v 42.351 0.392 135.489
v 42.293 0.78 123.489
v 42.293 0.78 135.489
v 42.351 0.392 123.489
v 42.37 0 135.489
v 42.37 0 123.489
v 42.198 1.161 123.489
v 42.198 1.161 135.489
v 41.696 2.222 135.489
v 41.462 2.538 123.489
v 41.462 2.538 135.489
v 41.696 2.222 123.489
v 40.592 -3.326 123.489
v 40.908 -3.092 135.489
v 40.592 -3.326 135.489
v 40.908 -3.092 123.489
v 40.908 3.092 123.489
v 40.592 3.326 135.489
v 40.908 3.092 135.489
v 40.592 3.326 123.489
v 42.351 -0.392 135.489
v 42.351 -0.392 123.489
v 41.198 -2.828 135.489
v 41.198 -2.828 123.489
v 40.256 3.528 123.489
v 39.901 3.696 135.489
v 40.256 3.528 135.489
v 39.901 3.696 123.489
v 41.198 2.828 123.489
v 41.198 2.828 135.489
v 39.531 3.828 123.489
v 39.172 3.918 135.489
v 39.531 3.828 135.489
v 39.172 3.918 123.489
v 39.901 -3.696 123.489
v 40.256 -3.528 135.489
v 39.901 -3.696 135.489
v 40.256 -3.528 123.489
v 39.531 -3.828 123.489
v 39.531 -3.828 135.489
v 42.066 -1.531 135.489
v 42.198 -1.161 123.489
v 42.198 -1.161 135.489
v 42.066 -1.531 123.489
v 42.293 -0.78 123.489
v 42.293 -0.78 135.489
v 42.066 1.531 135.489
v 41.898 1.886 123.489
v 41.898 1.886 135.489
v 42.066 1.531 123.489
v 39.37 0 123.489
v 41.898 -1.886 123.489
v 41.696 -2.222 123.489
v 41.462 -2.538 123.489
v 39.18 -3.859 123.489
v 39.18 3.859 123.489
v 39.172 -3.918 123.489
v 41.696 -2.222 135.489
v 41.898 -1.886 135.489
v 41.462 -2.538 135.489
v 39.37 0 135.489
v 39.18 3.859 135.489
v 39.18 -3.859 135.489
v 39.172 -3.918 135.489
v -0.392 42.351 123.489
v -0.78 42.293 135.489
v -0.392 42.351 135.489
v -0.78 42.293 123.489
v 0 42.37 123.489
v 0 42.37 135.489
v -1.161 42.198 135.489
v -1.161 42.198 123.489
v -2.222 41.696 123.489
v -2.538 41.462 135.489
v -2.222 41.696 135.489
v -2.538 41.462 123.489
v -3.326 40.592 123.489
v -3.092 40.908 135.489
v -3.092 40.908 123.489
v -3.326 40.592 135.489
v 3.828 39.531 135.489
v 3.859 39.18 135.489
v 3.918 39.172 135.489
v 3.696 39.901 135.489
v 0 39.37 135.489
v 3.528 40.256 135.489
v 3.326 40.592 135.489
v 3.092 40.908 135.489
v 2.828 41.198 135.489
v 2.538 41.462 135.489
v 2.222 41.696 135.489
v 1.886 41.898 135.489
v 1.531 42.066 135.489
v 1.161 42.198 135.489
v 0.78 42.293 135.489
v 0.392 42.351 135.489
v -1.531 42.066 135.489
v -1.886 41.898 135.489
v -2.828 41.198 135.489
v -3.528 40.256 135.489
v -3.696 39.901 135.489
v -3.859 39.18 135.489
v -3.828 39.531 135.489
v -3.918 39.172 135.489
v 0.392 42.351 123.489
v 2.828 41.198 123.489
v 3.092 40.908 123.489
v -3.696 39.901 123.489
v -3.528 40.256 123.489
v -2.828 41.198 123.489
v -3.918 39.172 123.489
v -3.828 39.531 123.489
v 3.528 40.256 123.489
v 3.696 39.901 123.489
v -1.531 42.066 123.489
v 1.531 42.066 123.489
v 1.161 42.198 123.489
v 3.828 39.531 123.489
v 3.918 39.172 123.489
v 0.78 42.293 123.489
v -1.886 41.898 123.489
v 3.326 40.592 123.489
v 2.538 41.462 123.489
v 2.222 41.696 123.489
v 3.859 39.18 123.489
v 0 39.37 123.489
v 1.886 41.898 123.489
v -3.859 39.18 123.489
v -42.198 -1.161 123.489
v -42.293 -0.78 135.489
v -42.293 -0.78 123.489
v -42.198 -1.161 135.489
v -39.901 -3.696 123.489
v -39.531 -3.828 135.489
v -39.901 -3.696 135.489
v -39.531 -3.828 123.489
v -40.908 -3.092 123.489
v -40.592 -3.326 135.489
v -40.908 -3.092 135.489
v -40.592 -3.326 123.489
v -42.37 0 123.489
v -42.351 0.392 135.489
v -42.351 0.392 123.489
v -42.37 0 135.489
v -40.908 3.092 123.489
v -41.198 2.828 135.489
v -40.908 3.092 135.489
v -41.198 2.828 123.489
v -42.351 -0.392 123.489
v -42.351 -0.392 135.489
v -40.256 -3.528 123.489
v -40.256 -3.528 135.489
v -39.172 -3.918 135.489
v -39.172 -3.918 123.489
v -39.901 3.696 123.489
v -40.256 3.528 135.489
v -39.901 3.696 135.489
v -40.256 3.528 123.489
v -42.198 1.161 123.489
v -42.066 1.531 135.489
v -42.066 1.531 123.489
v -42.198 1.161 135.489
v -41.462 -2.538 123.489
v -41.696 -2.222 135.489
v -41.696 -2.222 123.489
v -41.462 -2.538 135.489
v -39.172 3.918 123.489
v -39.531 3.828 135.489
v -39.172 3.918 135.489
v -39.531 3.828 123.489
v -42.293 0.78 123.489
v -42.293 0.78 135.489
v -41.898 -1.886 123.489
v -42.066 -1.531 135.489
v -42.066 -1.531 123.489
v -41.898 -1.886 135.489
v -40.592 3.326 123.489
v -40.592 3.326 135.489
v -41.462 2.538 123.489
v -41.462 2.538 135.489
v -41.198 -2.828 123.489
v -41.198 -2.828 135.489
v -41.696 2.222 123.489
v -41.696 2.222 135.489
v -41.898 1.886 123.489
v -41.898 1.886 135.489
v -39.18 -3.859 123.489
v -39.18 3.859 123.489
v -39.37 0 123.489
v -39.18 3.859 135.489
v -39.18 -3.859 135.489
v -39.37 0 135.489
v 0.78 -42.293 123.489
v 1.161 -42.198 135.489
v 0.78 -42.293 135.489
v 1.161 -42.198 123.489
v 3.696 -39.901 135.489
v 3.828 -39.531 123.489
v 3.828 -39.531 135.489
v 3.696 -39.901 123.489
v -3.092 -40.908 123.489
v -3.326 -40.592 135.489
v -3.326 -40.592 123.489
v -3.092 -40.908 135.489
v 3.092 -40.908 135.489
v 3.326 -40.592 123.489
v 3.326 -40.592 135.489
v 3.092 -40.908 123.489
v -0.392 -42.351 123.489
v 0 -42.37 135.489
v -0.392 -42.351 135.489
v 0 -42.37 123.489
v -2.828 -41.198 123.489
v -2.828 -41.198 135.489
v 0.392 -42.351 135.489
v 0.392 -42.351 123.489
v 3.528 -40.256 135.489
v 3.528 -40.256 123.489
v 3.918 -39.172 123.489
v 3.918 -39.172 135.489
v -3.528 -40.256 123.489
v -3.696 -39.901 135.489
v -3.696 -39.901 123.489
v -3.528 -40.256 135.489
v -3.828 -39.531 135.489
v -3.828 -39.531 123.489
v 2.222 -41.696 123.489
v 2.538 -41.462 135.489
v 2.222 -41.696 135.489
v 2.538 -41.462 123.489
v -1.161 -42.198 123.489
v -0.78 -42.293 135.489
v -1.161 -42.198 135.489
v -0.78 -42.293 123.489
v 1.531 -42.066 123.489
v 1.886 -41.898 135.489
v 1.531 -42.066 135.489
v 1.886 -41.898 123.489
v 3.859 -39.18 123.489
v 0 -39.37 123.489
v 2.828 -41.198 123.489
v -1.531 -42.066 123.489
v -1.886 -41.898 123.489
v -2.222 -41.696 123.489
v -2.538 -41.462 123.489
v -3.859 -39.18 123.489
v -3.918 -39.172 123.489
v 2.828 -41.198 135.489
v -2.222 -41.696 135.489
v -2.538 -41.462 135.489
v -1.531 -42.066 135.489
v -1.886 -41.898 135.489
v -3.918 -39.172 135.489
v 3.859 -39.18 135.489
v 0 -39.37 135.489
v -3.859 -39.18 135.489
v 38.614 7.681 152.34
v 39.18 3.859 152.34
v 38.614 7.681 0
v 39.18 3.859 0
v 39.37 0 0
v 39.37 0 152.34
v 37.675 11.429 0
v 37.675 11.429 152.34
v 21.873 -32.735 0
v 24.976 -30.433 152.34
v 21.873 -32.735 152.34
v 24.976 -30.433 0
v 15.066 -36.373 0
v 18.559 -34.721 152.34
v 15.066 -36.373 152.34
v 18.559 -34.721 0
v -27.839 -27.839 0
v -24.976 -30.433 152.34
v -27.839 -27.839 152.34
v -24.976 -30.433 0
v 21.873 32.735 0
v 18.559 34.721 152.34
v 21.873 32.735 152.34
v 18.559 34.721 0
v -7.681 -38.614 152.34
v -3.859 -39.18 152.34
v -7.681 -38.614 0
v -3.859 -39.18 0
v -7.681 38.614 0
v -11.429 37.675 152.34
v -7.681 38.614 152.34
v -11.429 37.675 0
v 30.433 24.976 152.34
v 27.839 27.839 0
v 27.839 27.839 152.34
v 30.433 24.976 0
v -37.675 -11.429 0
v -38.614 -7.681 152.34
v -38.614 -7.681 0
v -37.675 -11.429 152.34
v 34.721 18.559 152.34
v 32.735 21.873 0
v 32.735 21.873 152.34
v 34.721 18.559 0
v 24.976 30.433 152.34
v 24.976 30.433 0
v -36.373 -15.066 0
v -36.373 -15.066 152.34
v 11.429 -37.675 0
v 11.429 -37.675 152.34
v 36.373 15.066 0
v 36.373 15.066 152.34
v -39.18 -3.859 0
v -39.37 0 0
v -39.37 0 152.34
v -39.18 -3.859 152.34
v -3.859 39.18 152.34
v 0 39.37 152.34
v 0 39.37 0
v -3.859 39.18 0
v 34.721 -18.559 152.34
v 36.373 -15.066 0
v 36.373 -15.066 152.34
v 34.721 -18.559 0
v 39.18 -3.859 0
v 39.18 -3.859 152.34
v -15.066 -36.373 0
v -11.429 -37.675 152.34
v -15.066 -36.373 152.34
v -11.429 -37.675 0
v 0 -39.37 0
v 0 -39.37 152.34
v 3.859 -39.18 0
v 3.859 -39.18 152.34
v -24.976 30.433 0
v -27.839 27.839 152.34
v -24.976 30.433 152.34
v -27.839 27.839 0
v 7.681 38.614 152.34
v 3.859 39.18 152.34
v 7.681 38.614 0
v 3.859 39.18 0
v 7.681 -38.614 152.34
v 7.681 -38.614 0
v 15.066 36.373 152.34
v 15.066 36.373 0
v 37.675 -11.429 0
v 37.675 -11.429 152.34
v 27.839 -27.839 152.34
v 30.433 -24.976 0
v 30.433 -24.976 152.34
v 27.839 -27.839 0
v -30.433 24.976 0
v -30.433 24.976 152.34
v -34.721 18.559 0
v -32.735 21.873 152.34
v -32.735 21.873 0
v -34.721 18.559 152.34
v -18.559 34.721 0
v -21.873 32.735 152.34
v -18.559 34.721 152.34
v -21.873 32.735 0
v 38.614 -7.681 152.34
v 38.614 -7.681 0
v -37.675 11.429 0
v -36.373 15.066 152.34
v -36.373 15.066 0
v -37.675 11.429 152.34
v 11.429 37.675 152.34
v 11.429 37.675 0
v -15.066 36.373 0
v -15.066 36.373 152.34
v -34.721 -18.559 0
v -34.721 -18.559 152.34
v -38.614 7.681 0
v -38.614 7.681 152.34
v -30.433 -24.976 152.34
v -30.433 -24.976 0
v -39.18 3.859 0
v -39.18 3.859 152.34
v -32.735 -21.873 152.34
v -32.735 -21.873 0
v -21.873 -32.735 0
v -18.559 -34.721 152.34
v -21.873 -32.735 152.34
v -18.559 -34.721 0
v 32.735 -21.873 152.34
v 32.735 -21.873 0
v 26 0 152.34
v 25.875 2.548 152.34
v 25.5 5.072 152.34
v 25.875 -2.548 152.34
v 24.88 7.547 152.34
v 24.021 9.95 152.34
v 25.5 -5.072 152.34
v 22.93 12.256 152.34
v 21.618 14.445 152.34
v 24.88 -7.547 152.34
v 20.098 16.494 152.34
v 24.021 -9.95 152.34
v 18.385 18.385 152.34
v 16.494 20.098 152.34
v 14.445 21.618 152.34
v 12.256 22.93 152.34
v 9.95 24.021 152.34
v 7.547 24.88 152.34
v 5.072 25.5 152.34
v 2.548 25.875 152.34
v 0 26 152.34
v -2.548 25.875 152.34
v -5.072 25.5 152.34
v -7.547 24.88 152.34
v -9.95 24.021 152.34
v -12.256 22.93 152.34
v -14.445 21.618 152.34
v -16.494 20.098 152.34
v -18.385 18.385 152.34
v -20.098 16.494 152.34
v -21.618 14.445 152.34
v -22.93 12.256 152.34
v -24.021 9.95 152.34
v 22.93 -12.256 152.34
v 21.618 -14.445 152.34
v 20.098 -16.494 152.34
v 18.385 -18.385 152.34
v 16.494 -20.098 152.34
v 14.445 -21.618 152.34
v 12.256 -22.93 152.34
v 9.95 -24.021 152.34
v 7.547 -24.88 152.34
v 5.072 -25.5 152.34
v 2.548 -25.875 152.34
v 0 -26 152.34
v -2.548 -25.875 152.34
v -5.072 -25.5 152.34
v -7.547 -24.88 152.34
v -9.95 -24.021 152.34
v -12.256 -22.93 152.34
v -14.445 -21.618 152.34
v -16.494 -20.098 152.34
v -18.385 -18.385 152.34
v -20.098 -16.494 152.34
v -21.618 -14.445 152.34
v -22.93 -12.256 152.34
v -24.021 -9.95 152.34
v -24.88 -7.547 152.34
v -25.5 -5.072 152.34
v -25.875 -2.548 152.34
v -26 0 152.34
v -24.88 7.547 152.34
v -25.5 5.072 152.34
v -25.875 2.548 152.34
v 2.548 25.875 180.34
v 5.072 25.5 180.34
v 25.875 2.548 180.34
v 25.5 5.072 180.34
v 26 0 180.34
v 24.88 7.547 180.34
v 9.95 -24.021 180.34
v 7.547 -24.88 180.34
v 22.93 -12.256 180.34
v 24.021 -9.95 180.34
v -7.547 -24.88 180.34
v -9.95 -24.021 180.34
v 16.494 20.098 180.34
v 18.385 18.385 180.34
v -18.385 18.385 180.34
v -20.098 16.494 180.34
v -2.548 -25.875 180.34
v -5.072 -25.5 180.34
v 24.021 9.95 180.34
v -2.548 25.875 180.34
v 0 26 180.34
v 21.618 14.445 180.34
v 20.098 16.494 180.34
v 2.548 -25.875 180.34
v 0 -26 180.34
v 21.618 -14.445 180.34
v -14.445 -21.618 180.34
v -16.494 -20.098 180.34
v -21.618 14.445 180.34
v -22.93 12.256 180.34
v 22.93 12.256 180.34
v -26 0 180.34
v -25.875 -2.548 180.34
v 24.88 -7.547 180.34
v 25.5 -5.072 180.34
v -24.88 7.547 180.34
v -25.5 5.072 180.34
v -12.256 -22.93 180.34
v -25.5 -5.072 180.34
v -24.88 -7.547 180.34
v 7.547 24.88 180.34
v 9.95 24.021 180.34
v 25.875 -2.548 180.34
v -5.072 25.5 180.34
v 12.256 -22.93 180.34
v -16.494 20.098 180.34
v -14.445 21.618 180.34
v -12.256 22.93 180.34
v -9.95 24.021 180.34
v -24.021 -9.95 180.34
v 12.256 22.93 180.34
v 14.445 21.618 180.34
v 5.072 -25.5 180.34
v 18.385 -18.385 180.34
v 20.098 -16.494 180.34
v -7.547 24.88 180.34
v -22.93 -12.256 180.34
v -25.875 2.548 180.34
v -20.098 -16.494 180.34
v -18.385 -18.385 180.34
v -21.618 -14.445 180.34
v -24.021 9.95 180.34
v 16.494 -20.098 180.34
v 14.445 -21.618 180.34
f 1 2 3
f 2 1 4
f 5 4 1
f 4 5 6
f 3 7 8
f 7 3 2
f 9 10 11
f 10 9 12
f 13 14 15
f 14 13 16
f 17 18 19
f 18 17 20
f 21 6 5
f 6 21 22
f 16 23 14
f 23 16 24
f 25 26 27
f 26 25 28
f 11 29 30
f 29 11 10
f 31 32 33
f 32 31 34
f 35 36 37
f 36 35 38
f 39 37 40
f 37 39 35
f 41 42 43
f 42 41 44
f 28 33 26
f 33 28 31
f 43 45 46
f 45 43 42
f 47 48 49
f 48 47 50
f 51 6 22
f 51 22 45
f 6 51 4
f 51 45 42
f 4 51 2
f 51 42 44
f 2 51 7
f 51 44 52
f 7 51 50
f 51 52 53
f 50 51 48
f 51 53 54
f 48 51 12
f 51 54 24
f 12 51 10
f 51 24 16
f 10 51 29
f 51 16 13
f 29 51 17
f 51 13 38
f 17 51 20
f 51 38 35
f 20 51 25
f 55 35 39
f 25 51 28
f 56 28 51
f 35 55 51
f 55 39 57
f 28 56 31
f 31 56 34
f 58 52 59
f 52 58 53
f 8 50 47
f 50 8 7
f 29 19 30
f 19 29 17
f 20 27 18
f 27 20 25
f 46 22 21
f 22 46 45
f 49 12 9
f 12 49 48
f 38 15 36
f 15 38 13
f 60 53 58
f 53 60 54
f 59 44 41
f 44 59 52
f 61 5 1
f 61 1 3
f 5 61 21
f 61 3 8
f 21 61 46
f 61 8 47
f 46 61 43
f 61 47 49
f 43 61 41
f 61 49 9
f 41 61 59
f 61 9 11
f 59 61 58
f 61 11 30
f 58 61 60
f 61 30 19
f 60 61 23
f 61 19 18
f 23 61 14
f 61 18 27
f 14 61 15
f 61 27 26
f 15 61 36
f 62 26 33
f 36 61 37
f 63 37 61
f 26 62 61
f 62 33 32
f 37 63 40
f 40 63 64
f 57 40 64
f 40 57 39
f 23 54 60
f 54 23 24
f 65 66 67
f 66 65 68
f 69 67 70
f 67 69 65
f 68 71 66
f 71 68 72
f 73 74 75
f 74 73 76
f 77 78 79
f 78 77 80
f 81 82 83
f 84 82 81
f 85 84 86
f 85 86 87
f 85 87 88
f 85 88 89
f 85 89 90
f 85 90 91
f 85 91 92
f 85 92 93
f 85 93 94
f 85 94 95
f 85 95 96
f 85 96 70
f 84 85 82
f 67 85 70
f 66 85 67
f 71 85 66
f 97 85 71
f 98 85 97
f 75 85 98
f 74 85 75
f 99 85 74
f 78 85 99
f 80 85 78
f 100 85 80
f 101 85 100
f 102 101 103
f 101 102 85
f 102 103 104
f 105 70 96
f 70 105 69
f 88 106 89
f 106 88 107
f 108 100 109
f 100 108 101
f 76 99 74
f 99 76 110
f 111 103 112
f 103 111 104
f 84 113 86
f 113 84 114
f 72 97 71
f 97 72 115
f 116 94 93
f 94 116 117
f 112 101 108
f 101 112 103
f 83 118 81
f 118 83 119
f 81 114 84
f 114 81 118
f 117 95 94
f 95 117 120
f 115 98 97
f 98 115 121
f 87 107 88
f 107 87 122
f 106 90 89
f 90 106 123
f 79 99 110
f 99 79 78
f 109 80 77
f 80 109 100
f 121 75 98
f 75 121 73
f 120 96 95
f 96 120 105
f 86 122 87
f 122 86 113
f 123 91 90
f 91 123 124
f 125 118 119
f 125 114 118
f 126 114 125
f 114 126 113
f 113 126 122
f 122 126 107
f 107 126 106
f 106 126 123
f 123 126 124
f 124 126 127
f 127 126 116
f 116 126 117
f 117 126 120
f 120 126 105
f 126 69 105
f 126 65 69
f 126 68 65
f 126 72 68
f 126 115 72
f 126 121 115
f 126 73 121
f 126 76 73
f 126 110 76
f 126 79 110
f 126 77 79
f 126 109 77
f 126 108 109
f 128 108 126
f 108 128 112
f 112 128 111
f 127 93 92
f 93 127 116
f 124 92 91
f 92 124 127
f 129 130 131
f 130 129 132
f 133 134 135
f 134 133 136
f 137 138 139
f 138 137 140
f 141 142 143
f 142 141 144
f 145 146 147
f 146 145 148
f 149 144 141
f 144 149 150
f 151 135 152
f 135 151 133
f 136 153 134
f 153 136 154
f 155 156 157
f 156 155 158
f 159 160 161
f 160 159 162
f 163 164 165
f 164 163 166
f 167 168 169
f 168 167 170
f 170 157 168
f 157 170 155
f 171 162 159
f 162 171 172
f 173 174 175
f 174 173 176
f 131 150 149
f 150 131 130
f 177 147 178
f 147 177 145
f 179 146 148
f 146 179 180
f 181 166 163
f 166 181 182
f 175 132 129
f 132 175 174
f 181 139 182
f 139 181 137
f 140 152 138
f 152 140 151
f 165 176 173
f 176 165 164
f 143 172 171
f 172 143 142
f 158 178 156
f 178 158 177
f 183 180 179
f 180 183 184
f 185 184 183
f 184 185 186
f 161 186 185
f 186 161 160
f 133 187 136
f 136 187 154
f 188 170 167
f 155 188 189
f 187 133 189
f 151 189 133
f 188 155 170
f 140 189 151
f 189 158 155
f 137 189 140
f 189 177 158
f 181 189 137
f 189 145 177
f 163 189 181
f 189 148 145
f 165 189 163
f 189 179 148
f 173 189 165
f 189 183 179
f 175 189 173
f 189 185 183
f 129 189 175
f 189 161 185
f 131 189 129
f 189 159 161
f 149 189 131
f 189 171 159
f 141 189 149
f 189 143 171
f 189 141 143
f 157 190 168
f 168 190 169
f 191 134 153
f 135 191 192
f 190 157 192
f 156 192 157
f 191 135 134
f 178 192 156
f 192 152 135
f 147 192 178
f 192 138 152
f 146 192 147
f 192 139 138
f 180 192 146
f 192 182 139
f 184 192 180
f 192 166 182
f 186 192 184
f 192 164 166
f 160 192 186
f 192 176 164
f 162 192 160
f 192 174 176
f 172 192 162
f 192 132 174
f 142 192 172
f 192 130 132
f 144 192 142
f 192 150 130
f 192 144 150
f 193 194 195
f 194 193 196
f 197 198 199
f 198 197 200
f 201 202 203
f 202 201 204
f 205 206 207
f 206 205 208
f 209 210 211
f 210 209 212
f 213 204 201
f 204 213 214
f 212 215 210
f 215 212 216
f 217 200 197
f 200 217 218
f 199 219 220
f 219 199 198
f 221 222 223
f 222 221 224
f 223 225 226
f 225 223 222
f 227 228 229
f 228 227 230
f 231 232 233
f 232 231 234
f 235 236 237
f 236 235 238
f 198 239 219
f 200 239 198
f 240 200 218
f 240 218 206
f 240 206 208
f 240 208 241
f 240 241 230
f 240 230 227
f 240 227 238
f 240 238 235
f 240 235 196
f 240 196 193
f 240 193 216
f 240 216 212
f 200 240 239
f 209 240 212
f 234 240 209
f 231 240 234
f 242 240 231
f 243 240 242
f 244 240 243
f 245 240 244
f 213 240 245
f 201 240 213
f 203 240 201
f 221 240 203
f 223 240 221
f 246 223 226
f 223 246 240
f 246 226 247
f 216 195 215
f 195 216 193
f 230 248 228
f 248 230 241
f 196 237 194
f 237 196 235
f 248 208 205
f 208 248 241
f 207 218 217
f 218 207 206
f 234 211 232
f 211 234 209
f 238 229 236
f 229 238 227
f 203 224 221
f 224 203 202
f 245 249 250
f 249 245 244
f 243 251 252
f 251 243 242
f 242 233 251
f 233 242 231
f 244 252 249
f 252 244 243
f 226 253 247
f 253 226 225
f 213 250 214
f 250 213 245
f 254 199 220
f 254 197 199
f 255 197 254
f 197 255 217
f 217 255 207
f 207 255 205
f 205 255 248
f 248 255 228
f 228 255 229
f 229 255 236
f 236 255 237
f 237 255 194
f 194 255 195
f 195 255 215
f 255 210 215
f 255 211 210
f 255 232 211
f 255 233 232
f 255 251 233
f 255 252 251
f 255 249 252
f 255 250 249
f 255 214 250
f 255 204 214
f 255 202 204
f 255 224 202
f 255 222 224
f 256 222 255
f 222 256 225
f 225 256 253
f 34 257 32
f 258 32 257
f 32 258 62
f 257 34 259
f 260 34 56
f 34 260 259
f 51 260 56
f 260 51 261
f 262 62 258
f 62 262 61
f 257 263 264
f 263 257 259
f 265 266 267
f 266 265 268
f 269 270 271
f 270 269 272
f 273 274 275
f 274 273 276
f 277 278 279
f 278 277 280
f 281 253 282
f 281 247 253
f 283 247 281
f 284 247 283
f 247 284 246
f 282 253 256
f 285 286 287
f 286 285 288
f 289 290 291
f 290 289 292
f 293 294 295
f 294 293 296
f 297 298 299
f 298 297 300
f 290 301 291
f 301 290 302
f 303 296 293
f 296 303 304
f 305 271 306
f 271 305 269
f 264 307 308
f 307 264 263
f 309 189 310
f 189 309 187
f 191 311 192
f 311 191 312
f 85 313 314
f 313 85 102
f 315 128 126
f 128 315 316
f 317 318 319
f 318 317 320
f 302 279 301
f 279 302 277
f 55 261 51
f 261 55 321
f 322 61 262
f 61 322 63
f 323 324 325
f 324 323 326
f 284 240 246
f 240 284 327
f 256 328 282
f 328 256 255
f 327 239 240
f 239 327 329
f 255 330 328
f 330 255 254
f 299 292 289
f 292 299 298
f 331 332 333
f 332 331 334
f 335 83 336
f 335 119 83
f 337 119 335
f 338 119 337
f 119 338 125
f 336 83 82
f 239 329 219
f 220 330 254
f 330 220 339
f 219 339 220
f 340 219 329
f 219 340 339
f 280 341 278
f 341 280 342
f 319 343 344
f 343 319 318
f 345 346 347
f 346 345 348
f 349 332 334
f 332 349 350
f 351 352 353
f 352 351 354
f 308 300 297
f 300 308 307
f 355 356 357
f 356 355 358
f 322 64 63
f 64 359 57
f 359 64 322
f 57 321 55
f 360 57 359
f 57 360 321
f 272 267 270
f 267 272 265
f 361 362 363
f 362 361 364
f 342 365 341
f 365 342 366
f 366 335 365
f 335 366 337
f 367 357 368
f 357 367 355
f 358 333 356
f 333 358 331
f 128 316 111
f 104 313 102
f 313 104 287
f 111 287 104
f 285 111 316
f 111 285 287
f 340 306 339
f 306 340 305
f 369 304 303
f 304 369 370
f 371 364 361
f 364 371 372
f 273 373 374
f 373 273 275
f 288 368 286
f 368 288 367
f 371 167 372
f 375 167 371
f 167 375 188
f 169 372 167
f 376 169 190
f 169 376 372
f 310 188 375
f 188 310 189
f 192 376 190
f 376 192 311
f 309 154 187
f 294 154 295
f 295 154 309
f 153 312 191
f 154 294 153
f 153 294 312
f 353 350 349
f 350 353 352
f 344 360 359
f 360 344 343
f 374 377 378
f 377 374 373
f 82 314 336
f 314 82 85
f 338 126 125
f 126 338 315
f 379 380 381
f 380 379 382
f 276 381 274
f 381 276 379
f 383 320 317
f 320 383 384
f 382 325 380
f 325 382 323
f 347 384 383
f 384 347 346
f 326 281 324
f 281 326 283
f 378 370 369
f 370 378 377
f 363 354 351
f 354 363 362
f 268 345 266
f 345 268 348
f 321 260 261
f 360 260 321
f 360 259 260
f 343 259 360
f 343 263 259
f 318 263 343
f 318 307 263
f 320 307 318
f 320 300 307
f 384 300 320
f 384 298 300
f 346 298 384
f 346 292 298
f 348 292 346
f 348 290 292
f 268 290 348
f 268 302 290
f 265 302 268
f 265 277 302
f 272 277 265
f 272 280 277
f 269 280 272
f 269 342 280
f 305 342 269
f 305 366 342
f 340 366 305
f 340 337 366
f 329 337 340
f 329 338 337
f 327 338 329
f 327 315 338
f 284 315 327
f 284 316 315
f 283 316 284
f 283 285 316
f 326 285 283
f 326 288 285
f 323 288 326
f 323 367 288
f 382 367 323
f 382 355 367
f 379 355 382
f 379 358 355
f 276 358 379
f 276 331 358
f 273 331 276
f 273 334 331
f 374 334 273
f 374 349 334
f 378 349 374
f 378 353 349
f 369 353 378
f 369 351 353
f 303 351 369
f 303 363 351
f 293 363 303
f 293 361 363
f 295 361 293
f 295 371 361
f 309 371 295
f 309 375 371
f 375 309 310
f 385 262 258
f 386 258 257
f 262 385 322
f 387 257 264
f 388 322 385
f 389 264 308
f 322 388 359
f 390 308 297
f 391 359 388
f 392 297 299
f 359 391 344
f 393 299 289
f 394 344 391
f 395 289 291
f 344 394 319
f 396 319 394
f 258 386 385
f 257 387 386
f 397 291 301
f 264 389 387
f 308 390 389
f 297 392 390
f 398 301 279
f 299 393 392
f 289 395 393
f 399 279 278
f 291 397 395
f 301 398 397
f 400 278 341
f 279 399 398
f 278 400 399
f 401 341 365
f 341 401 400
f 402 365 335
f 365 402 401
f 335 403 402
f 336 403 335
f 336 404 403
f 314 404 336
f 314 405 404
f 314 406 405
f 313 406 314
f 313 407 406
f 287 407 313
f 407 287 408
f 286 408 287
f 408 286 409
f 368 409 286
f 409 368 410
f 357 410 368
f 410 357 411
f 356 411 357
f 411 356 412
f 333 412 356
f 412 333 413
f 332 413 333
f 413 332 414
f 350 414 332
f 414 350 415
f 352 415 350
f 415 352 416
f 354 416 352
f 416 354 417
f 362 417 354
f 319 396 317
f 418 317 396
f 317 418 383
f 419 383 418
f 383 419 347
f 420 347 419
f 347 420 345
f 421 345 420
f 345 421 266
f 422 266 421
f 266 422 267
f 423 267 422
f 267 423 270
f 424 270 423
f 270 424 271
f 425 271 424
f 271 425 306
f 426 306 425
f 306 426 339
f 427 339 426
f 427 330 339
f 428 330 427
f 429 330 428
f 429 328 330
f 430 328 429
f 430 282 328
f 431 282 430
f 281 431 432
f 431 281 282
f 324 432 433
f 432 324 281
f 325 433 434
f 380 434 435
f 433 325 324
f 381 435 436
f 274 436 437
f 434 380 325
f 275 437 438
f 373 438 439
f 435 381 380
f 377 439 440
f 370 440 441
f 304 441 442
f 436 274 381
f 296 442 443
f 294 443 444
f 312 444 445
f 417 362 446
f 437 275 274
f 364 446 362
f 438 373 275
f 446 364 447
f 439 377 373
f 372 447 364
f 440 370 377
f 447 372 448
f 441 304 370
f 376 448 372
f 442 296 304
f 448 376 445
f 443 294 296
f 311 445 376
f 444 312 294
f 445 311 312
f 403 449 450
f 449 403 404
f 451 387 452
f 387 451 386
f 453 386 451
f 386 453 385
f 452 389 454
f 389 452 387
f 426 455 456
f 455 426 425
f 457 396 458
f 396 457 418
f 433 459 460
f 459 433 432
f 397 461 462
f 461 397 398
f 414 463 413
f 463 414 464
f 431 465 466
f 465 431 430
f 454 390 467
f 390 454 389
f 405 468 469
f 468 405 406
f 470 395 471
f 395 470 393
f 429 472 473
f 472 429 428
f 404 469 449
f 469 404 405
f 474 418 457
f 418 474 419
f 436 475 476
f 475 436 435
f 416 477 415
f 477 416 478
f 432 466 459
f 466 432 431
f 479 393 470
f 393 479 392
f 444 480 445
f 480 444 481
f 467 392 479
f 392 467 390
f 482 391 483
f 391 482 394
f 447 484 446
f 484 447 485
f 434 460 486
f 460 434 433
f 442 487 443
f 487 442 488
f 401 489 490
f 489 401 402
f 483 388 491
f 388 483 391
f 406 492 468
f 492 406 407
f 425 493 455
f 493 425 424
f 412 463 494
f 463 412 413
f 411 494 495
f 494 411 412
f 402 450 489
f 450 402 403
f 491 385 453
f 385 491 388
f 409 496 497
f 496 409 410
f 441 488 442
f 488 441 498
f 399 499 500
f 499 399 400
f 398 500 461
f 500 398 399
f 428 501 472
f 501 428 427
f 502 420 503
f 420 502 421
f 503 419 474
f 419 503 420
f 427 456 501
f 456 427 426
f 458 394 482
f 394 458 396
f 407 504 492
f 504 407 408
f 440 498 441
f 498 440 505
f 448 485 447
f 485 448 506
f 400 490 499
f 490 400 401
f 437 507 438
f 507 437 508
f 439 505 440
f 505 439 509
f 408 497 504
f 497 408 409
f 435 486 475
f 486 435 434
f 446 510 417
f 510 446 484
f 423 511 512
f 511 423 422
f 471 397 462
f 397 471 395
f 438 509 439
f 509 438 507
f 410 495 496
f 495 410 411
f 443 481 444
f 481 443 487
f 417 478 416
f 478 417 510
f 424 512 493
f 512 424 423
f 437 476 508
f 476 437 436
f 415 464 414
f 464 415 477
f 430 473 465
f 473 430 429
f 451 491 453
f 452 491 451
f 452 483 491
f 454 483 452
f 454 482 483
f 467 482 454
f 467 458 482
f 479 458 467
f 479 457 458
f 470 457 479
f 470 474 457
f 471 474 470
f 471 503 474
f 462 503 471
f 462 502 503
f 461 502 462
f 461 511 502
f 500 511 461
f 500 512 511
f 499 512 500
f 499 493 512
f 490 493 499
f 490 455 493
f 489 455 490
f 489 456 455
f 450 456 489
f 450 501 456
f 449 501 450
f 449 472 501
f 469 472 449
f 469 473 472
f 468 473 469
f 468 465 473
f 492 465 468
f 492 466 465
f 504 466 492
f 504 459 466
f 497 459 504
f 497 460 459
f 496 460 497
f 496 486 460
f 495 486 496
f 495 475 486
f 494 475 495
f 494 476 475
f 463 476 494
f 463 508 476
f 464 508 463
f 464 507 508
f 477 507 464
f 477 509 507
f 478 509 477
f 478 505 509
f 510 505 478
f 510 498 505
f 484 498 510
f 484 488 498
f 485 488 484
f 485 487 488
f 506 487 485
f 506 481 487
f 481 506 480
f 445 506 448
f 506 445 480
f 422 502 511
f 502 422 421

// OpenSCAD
// MS-V parametric body — OpenSCAD source (Tier B)
// Units: mm. Z = long axis (throw direction when stored vertically in pouch)
// STATUS: Engineering estimate — NOT VALIDATION

wall_mm = 2.0;
length_mm = 7.1 * 25.4;
diameter_mm = 3.1 * 25.4;
fuze_stack_mm = 28;
fuze_diameter_mm = 52;

body_r = diameter_mm / 2;
fuze_r = fuze_diameter_mm / 2;
body_h = length_mm - fuze_stack_mm;

$fn = 64;

union() {
    cylinder(h = body_h, r = body_r);
    translate([0, 0, body_h])
        cylinder(h = fuze_stack_mm, r = fuze_r);
    // emission ports (visual only)
    for (a = [0:90:270])
        rotate([0, 0, a])
            translate([body_r - 1, 0, body_h * 0.85])
                cylinder(h = 12, r = 4, center = true);
    translate([0, 0, 8])
        cylinder(h = 10, r = 4, center = true);
}

// AN-M8 reference (offset for scale compare) — uncomment to preview
// translate([120, 0, 0])
//     cylinder(h = 5.7 * 25.4, r = 2.5 * 25.4 / 2);
